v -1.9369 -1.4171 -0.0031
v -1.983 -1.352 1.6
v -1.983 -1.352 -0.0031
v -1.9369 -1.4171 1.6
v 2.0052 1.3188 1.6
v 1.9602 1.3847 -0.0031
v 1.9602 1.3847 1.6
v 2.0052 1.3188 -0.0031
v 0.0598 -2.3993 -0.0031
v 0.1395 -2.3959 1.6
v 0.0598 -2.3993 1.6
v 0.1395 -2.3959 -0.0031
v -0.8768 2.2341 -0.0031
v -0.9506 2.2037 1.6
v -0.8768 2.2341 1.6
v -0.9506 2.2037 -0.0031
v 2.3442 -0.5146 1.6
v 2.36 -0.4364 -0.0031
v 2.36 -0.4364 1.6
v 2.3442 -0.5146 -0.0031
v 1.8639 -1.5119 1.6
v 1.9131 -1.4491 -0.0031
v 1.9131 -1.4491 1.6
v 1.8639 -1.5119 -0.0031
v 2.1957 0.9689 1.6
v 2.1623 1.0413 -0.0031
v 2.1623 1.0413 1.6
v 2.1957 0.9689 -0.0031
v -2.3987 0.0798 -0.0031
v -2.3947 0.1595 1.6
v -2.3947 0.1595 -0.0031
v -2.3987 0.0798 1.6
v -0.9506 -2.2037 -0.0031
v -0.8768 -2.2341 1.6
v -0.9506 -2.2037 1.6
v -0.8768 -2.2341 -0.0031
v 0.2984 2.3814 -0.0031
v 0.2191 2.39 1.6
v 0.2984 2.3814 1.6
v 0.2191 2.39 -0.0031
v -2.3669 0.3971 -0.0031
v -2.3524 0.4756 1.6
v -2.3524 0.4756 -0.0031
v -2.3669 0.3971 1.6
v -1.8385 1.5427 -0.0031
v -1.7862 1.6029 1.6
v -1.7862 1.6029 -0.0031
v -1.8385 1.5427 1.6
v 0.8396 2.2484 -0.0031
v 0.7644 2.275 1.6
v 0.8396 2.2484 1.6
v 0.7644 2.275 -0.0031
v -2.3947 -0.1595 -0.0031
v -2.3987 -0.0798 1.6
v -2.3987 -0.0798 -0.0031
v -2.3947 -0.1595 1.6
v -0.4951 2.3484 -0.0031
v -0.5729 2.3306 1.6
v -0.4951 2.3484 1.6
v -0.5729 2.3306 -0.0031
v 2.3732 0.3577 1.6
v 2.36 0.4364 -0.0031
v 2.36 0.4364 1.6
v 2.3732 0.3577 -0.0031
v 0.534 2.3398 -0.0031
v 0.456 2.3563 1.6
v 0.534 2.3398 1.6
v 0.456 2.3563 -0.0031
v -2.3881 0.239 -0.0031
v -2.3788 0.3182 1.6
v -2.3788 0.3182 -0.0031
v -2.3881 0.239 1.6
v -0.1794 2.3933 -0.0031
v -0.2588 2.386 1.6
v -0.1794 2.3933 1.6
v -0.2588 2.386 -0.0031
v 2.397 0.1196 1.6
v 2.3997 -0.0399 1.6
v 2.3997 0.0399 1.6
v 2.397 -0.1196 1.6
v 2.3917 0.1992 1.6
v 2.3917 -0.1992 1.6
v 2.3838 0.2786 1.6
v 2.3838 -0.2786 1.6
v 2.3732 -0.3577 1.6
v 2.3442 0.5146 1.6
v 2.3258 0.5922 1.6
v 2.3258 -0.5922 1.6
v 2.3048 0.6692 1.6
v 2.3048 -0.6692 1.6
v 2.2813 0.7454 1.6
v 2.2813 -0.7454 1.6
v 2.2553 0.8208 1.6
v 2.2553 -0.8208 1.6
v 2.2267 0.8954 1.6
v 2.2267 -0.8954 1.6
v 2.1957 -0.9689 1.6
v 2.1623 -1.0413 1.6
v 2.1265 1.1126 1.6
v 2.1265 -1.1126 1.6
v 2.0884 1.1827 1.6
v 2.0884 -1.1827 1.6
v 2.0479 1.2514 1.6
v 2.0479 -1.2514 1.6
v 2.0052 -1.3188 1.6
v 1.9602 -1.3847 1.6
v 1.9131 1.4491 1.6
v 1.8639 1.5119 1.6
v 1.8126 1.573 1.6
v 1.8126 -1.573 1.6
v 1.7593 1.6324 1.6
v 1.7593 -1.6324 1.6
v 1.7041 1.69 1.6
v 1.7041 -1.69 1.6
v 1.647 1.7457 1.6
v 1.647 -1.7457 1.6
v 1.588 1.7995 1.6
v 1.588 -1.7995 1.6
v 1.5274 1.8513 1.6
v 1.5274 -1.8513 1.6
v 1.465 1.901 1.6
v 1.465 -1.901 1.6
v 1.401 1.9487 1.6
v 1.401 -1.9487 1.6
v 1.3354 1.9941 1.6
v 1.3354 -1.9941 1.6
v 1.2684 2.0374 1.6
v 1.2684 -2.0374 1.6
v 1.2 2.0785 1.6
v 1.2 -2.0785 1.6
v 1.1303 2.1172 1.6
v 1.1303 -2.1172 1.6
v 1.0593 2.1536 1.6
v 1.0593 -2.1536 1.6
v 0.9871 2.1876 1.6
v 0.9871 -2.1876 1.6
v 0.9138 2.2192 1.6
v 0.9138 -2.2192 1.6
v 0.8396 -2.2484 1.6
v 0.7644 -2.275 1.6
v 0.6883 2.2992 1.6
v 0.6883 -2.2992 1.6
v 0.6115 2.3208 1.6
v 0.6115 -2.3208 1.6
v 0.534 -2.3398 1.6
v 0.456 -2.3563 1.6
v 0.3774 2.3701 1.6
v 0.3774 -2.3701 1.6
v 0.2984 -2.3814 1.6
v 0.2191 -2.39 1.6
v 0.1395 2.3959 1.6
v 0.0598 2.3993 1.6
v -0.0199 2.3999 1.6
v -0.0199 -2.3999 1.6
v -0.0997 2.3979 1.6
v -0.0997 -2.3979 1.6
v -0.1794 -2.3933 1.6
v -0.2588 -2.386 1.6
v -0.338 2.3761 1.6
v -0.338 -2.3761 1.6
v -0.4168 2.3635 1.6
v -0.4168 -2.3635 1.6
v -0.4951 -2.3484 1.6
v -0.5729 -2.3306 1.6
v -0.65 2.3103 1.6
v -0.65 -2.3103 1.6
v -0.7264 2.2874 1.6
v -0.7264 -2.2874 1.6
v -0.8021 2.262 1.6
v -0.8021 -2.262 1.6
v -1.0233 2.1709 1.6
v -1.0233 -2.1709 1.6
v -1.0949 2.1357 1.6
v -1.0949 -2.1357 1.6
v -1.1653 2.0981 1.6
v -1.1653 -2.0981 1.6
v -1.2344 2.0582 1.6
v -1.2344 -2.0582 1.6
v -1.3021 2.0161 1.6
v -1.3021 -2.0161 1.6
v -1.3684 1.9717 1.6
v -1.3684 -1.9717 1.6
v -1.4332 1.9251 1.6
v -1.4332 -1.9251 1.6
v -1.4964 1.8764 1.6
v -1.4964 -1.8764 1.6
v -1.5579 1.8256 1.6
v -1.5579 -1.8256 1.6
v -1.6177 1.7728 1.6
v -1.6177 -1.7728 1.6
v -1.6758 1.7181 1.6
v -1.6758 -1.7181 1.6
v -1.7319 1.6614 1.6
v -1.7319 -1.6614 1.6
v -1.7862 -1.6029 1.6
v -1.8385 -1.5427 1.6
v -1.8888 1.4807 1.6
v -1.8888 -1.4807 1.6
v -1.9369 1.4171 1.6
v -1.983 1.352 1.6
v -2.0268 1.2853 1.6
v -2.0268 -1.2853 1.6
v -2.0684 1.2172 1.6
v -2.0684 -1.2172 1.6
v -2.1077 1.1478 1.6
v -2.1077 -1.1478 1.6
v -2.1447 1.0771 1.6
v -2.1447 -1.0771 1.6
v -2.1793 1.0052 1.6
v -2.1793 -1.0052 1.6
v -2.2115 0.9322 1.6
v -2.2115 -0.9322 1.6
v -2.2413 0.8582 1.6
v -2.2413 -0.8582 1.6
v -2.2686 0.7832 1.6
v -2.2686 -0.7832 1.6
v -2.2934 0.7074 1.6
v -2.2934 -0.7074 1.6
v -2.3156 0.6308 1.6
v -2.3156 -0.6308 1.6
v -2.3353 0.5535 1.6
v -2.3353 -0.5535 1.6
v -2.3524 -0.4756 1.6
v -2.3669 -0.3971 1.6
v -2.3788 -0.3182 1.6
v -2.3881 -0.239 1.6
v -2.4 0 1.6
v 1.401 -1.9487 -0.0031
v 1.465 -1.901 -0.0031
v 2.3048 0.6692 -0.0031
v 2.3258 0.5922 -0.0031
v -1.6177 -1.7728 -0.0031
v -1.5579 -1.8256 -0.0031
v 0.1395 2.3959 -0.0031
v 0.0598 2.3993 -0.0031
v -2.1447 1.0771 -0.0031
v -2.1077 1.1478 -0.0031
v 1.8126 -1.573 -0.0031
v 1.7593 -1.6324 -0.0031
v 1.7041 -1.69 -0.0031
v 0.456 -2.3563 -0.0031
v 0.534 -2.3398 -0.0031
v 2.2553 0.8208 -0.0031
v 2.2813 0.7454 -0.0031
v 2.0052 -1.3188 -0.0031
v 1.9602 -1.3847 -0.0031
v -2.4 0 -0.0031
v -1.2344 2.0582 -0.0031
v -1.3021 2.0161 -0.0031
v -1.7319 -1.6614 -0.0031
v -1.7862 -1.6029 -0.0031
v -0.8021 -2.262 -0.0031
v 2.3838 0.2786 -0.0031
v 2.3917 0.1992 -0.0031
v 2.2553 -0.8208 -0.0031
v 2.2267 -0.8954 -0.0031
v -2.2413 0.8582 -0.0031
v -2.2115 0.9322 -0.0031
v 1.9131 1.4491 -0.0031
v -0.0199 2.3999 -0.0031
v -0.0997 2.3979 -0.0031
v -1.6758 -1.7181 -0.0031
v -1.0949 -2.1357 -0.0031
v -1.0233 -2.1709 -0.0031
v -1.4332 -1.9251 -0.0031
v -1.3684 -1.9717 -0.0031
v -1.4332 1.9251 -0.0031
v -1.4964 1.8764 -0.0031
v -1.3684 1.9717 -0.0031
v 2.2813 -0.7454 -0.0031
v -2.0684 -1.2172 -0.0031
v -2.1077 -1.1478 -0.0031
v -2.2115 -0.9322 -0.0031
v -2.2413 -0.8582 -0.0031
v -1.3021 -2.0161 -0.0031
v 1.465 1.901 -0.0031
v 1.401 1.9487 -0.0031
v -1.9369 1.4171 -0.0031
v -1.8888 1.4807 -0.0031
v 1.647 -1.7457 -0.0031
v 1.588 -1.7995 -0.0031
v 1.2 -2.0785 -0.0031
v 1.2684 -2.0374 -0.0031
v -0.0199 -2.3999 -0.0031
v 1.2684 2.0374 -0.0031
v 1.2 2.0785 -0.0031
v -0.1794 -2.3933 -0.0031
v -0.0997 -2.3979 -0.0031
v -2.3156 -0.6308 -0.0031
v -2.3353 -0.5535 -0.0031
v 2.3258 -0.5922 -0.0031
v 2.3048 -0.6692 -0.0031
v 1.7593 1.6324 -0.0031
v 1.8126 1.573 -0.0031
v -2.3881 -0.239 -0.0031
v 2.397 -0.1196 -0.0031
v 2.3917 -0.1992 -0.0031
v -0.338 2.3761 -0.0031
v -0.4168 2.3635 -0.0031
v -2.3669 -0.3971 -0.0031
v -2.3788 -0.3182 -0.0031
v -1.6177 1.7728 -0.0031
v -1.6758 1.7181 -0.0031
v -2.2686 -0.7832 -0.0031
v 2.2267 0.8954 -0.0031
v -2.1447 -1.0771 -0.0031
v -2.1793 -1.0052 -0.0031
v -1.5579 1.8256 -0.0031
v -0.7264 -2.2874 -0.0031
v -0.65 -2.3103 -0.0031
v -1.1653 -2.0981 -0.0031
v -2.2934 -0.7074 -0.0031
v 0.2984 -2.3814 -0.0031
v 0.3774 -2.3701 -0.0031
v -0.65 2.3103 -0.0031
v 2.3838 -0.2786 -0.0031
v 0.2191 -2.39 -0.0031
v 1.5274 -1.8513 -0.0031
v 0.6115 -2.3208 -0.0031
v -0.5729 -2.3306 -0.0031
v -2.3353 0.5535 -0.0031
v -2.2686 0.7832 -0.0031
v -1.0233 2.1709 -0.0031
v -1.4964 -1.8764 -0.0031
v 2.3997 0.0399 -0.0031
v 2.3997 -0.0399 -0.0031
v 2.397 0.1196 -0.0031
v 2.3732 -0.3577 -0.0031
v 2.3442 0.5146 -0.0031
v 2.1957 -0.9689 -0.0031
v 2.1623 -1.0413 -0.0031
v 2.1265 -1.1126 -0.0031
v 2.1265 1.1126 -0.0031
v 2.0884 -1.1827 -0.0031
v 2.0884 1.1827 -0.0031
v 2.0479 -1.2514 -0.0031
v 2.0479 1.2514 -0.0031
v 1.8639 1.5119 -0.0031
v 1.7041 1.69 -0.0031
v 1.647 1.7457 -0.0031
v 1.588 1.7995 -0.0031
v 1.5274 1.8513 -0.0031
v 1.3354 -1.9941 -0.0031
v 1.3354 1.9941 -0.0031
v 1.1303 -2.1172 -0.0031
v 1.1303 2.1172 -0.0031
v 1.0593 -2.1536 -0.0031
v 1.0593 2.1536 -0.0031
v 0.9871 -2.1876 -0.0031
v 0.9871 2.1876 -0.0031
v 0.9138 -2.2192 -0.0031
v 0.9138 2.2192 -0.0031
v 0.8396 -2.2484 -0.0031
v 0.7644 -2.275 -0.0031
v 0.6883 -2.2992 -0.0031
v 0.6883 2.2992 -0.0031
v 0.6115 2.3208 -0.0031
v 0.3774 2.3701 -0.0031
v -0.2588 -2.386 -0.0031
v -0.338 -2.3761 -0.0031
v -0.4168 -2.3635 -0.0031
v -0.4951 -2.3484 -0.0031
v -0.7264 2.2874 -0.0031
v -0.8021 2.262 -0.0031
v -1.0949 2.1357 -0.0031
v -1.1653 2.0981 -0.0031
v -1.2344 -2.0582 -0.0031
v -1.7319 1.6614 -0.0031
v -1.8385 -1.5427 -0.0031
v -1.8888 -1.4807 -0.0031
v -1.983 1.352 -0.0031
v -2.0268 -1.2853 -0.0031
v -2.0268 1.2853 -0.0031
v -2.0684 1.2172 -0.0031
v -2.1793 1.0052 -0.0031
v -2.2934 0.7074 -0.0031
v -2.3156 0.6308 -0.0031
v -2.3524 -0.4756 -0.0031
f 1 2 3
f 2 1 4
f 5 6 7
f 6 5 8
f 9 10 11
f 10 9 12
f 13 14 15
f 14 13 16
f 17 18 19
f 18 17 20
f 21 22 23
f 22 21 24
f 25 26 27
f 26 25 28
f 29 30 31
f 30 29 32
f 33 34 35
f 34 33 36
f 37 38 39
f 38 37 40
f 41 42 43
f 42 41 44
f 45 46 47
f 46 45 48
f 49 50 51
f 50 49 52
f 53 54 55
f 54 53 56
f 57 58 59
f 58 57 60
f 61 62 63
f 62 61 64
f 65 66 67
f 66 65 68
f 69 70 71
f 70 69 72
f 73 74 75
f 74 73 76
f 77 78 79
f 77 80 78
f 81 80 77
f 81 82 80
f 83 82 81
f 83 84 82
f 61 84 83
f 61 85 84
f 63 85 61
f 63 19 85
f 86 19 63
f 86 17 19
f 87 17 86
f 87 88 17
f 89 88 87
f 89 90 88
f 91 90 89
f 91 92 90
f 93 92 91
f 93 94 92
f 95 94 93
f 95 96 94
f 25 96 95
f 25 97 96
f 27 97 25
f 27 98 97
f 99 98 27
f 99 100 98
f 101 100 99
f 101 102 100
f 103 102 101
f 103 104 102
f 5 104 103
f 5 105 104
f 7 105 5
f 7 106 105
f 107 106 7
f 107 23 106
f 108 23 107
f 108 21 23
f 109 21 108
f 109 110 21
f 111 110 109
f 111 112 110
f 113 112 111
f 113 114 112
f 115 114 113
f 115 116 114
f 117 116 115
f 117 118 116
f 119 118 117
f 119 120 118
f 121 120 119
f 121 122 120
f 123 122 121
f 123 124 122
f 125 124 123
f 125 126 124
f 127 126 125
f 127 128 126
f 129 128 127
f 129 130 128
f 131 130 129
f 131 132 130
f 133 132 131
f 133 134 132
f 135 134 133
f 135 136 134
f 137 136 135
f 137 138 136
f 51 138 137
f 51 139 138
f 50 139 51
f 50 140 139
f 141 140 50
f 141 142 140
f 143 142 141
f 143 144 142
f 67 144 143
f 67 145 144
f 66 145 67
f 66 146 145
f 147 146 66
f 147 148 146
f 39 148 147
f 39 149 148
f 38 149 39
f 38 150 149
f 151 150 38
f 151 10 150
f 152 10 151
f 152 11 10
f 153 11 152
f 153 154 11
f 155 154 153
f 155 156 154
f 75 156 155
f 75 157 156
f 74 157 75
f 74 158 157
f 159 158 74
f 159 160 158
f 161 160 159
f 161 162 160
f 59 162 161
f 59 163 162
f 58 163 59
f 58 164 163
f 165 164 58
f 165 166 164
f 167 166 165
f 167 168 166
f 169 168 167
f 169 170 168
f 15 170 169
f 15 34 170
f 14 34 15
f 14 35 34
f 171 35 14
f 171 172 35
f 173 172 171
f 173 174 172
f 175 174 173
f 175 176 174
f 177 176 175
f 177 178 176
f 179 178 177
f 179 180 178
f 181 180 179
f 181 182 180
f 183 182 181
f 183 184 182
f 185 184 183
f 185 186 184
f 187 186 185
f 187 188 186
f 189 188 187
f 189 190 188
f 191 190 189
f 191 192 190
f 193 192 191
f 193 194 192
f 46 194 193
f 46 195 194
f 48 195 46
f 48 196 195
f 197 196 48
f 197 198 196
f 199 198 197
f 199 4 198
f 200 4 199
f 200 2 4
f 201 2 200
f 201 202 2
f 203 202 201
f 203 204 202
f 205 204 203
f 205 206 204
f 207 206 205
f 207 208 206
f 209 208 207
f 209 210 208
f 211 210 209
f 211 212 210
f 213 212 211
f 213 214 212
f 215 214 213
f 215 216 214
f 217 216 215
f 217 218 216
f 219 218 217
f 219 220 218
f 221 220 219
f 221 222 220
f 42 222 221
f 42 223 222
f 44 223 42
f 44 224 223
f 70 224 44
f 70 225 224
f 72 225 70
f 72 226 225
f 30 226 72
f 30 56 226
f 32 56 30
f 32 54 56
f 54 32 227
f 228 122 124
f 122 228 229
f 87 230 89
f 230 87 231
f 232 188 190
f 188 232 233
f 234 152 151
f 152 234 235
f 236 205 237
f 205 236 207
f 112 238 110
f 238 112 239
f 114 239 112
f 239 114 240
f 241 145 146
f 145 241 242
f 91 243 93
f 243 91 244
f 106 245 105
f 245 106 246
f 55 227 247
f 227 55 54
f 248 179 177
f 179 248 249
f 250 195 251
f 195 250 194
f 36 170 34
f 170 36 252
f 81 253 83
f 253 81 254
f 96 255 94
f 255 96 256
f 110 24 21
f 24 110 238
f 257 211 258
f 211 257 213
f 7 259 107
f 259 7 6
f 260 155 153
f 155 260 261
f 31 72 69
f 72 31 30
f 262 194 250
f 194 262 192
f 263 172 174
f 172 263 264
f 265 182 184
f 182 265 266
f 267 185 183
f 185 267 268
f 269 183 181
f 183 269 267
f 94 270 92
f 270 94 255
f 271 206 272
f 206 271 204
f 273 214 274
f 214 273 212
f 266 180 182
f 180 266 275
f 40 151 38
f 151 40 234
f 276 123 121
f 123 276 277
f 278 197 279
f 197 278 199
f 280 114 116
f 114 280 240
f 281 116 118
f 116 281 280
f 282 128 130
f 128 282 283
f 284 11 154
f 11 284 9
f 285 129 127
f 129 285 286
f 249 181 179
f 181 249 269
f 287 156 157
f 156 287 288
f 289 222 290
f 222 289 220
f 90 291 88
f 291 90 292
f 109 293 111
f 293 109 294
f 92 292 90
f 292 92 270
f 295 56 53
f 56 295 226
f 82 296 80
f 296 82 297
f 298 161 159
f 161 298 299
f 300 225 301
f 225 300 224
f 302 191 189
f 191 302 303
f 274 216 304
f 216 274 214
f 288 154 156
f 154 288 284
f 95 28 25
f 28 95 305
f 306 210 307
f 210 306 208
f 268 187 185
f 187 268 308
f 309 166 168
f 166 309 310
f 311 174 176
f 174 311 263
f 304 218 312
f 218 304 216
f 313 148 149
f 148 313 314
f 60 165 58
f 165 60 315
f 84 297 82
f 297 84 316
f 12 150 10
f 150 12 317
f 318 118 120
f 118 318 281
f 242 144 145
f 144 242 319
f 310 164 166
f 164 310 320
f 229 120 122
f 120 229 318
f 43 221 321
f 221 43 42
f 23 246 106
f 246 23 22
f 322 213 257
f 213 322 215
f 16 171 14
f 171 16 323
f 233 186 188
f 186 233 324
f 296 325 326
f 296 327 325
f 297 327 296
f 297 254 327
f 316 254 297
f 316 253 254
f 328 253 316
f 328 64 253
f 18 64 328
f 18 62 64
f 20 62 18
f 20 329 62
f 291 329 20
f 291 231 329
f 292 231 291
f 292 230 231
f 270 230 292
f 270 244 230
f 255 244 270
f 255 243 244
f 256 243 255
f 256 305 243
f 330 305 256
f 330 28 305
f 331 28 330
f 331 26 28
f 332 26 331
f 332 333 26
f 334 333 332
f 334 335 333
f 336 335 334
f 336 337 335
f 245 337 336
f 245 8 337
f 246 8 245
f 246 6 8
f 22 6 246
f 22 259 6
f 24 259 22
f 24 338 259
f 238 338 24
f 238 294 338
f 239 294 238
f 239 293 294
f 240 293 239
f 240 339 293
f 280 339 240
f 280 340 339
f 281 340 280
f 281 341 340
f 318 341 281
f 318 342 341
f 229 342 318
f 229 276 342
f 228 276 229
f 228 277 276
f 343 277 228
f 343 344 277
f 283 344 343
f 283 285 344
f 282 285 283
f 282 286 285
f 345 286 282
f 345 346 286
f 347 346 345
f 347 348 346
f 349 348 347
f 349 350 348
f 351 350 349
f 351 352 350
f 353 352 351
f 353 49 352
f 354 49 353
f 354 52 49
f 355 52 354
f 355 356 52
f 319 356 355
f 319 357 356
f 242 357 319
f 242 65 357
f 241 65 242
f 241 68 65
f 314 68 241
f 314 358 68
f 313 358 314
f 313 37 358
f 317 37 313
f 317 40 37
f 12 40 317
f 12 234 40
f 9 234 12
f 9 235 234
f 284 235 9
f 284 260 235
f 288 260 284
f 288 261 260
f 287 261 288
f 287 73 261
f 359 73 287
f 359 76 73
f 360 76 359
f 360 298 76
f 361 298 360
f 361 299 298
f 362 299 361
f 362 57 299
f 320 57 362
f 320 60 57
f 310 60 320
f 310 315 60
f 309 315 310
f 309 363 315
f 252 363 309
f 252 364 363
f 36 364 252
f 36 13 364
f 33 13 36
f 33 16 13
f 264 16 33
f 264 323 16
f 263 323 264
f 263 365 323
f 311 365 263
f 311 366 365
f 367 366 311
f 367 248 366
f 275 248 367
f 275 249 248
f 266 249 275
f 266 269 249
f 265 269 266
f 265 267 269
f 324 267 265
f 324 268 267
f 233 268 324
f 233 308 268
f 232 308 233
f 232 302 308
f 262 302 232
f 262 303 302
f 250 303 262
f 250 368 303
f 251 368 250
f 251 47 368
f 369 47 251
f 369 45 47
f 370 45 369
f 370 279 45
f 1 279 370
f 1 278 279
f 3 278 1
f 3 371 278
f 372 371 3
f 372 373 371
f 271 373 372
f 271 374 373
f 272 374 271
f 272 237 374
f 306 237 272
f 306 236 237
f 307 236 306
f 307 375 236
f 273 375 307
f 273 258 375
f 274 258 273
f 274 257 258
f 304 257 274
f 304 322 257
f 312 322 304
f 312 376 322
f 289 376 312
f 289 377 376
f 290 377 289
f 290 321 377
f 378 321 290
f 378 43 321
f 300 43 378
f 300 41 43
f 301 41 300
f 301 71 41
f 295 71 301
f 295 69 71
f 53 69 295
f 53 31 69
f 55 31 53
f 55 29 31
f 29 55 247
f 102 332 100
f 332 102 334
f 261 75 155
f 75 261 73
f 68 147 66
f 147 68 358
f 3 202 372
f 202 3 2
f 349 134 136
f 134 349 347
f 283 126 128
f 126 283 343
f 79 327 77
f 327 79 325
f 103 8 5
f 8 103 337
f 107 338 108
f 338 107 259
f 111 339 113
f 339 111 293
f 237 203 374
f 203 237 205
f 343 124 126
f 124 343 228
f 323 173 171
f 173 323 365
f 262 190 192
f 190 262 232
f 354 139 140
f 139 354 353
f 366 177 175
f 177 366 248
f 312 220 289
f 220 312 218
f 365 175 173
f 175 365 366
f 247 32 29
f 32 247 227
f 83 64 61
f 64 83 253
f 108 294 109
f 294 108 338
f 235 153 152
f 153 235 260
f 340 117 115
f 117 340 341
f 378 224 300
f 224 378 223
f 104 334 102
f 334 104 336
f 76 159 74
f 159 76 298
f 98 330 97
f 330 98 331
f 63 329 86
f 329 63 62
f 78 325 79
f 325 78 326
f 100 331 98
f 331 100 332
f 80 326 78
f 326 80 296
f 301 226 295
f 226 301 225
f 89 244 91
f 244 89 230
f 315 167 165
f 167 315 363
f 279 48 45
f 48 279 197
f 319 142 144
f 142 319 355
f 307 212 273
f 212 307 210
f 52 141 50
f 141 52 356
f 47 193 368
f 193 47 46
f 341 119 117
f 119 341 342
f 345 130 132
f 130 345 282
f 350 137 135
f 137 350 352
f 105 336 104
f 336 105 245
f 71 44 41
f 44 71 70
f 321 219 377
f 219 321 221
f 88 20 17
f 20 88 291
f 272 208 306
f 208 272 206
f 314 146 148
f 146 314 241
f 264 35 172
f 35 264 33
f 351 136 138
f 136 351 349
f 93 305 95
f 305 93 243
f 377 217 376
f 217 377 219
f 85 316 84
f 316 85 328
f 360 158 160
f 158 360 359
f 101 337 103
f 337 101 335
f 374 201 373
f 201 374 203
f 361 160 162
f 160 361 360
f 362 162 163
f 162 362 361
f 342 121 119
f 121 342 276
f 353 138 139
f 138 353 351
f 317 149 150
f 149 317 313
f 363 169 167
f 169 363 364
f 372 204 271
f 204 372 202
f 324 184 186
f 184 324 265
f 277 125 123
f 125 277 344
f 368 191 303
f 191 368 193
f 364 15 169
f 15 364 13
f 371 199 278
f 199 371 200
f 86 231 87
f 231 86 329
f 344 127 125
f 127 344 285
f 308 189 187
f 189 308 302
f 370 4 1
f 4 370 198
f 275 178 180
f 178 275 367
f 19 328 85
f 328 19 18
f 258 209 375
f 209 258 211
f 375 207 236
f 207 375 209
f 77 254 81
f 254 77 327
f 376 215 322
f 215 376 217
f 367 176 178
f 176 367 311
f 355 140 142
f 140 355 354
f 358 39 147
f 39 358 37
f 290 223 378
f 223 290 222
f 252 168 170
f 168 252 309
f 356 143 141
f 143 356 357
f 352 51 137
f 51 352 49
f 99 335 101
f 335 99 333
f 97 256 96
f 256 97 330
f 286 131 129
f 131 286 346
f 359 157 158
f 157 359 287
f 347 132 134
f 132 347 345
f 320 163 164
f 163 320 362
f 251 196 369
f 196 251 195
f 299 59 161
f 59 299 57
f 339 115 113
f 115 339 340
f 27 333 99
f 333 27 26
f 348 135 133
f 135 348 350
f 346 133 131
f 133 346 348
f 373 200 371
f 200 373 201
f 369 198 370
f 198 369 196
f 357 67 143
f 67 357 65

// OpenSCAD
use <../lib.scad>
use <3665.scad>
$fa=1; $fs=0.2;
function ldraw_lib__100(realsolid=false) = [
// 0 ~Moved to 3665
// 0 Name: 100.dat
// 0 Author: [PTadmin]
// 0 !LDRAW_ORG Part UPDATE 1998-06
// 0 !LICENSE Licensed under CC BY 4.0 : see CAreadme.txt
// 
// 0 BFC CERTIFY CCW
  [0,"BFC","CERTIFY"],
  [0,"BFC","CCW"],
// 
// 0 !HISTORY 1998-06-20 [PTadmin] Official Update 1998-06
// 0 !HISTORY 2007-05-08 [PTadmin] Header formatted for Contributor Agreement
// 0 !HISTORY 2008-07-01 [PTadmin] Official Update 2008-01
// 
// 
// 1 16 0 0 0 1 0 0 0 1 0 0 0 1 3665.dat
  [1,16,0,0,0,1,0,0,0,1,0,0,0,1, ldraw_lib__3665(realsolid)],
];
module ldraw_lib__100(step=0, col=false, unit=2/5, alt=false, line=0.2, solid=!$preview)
    makepoly(ldraw_lib__100(solid), step=step, col=col, unit=unit, alt=alt, line=line, solid=solid);
ldraw_lib__100(line=0.2);
